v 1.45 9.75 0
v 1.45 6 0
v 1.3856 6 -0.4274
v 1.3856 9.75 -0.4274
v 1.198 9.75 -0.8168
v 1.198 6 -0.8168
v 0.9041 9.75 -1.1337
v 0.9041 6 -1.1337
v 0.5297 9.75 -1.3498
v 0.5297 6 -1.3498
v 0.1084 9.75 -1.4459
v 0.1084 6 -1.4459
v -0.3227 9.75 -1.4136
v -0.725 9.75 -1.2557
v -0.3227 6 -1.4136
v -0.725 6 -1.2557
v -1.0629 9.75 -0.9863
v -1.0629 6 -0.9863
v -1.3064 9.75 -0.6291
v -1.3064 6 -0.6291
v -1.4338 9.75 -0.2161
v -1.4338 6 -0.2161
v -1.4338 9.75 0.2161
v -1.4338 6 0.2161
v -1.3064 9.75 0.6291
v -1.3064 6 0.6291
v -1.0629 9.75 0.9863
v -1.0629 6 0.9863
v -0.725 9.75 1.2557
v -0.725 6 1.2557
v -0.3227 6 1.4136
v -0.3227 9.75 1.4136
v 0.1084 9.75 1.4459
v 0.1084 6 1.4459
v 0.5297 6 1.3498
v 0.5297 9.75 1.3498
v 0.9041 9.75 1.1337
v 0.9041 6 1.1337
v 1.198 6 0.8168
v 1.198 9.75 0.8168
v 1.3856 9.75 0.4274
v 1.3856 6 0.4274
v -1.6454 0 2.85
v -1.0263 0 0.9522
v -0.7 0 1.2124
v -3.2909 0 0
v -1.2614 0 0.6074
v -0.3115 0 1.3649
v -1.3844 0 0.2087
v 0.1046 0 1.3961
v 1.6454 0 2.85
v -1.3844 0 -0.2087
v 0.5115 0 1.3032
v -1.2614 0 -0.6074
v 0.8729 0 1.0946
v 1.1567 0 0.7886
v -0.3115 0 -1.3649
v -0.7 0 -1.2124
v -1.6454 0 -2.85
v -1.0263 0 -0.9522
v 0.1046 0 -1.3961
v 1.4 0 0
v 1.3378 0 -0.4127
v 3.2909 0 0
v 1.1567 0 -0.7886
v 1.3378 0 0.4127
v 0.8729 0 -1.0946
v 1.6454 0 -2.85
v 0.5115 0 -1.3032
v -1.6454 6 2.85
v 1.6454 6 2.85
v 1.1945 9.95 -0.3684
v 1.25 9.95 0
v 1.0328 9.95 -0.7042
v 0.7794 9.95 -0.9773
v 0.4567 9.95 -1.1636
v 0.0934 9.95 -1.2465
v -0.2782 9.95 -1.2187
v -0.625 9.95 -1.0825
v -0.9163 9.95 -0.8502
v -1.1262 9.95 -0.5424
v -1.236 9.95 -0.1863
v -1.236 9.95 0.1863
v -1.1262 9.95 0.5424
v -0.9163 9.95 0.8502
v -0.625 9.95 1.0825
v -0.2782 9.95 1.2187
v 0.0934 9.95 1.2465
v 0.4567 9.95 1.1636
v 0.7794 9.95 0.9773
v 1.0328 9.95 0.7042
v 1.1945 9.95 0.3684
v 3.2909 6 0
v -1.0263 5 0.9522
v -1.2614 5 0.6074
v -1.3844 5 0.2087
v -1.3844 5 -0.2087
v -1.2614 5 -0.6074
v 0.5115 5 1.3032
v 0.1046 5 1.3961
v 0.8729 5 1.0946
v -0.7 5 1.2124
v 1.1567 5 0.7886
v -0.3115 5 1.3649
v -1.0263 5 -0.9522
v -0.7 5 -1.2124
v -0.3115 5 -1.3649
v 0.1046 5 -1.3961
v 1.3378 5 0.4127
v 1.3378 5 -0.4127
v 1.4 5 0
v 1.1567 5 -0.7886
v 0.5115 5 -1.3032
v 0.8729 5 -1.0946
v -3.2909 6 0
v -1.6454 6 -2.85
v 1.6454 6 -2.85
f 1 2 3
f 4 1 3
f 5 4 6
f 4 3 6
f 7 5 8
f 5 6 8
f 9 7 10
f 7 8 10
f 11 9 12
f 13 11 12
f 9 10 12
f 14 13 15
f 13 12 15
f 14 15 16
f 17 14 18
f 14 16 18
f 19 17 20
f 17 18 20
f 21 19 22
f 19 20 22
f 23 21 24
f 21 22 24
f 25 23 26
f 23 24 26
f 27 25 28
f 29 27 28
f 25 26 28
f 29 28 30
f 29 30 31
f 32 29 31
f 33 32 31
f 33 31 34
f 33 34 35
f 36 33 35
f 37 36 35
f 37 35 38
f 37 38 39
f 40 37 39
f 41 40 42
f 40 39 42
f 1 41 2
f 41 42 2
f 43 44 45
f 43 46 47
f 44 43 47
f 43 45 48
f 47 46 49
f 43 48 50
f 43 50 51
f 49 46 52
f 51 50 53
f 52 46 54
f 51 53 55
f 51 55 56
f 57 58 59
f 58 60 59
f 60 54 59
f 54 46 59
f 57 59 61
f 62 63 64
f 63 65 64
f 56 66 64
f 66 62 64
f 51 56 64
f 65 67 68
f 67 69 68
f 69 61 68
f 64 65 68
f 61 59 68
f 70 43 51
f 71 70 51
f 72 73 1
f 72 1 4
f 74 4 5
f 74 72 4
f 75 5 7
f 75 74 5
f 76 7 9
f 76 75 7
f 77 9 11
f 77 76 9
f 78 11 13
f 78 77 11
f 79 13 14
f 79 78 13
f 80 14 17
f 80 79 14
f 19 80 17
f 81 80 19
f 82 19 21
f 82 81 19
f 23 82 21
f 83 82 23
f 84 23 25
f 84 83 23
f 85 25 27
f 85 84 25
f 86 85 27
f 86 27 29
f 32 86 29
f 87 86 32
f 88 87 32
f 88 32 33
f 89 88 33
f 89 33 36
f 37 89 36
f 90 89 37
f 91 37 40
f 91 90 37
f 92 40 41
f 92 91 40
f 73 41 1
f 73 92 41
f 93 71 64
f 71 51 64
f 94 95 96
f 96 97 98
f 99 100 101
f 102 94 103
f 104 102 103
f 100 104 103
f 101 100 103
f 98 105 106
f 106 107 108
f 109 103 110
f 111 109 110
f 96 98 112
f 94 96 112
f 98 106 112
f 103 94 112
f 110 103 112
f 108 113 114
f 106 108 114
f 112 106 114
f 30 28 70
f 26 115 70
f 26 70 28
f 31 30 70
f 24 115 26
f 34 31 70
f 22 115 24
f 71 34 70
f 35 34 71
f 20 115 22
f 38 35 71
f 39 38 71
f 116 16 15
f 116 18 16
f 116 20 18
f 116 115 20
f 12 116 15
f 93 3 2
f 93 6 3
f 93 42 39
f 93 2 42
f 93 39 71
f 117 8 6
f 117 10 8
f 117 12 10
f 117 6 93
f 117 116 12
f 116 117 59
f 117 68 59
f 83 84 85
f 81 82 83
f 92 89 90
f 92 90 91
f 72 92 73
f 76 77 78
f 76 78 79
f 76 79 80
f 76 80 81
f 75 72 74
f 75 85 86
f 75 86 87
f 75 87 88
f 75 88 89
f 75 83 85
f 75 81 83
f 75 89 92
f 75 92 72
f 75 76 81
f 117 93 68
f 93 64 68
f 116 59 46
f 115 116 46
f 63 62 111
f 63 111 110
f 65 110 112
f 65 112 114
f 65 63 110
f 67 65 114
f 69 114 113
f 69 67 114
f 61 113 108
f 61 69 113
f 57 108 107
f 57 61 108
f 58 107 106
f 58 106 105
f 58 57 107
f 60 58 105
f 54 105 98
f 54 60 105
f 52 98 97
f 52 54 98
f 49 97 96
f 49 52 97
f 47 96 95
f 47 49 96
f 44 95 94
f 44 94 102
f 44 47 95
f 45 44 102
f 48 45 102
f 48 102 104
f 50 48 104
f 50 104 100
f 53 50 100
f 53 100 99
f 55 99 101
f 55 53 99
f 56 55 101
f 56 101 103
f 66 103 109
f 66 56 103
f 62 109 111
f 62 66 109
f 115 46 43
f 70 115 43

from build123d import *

# Parameters (mm, degrees)
SKETCH1_R           = 1.4
BOSS_EXTRUDE1_DEPTH = 5
BOSS_EXTRUDE2_DEPTH = 1
SKETCH3_R           = 1.45
BOSS_EXTRUDE3_DEPTH = 3.95
CHAMFER1_SIZE       = 0.2


with BuildPart() as part:
    # Sketch1 → Boss-Extrude1 (new body)
    with BuildSketch(Plane(origin=(0, 0, 0), x_dir=(1, 0, 0), z_dir=(0, 1, 0))):
        Polygon((1.645448267, -2.85), (3.290896534, 0), (1.645448267, 2.85), (-1.645448267, 2.85), (-3.290896534, 0), (-1.645448267, -2.85), align=None)
        Circle(SKETCH1_R, mode=Mode.SUBTRACT)
    extrude(amount=BOSS_EXTRUDE1_DEPTH)

    # Sketch2 → Boss-Extrude2 (add)
    with BuildSketch(Plane(origin=(0, 5, 0), x_dir=(1, 0, 0), z_dir=(0, 1, 0))):
        Polygon((-1.645448267, -2.85), (1.645448267, -2.85), (3.290896534, 0), (1.645448267, 2.85), (-1.645448267, 2.85), (-3.290896534, 0), align=None)
    extrude(amount=BOSS_EXTRUDE2_DEPTH)

    # Sketch3 → Boss-Extrude3 (add)
    with BuildSketch(Plane(origin=(0, 6, 0), x_dir=(1, 0, 0), z_dir=(0, 1, 0))):
        Circle(SKETCH3_R)
    extrude(amount=BOSS_EXTRUDE3_DEPTH)

    # Chamfer1
    chamfer1_edges = [part.edges().sort_by_distance(p)[0] for p in [
        (-1.45, 9.95, 0),
    ]]
    chamfer(chamfer1_edges, length=CHAMFER1_SIZE)


solid = part.part
